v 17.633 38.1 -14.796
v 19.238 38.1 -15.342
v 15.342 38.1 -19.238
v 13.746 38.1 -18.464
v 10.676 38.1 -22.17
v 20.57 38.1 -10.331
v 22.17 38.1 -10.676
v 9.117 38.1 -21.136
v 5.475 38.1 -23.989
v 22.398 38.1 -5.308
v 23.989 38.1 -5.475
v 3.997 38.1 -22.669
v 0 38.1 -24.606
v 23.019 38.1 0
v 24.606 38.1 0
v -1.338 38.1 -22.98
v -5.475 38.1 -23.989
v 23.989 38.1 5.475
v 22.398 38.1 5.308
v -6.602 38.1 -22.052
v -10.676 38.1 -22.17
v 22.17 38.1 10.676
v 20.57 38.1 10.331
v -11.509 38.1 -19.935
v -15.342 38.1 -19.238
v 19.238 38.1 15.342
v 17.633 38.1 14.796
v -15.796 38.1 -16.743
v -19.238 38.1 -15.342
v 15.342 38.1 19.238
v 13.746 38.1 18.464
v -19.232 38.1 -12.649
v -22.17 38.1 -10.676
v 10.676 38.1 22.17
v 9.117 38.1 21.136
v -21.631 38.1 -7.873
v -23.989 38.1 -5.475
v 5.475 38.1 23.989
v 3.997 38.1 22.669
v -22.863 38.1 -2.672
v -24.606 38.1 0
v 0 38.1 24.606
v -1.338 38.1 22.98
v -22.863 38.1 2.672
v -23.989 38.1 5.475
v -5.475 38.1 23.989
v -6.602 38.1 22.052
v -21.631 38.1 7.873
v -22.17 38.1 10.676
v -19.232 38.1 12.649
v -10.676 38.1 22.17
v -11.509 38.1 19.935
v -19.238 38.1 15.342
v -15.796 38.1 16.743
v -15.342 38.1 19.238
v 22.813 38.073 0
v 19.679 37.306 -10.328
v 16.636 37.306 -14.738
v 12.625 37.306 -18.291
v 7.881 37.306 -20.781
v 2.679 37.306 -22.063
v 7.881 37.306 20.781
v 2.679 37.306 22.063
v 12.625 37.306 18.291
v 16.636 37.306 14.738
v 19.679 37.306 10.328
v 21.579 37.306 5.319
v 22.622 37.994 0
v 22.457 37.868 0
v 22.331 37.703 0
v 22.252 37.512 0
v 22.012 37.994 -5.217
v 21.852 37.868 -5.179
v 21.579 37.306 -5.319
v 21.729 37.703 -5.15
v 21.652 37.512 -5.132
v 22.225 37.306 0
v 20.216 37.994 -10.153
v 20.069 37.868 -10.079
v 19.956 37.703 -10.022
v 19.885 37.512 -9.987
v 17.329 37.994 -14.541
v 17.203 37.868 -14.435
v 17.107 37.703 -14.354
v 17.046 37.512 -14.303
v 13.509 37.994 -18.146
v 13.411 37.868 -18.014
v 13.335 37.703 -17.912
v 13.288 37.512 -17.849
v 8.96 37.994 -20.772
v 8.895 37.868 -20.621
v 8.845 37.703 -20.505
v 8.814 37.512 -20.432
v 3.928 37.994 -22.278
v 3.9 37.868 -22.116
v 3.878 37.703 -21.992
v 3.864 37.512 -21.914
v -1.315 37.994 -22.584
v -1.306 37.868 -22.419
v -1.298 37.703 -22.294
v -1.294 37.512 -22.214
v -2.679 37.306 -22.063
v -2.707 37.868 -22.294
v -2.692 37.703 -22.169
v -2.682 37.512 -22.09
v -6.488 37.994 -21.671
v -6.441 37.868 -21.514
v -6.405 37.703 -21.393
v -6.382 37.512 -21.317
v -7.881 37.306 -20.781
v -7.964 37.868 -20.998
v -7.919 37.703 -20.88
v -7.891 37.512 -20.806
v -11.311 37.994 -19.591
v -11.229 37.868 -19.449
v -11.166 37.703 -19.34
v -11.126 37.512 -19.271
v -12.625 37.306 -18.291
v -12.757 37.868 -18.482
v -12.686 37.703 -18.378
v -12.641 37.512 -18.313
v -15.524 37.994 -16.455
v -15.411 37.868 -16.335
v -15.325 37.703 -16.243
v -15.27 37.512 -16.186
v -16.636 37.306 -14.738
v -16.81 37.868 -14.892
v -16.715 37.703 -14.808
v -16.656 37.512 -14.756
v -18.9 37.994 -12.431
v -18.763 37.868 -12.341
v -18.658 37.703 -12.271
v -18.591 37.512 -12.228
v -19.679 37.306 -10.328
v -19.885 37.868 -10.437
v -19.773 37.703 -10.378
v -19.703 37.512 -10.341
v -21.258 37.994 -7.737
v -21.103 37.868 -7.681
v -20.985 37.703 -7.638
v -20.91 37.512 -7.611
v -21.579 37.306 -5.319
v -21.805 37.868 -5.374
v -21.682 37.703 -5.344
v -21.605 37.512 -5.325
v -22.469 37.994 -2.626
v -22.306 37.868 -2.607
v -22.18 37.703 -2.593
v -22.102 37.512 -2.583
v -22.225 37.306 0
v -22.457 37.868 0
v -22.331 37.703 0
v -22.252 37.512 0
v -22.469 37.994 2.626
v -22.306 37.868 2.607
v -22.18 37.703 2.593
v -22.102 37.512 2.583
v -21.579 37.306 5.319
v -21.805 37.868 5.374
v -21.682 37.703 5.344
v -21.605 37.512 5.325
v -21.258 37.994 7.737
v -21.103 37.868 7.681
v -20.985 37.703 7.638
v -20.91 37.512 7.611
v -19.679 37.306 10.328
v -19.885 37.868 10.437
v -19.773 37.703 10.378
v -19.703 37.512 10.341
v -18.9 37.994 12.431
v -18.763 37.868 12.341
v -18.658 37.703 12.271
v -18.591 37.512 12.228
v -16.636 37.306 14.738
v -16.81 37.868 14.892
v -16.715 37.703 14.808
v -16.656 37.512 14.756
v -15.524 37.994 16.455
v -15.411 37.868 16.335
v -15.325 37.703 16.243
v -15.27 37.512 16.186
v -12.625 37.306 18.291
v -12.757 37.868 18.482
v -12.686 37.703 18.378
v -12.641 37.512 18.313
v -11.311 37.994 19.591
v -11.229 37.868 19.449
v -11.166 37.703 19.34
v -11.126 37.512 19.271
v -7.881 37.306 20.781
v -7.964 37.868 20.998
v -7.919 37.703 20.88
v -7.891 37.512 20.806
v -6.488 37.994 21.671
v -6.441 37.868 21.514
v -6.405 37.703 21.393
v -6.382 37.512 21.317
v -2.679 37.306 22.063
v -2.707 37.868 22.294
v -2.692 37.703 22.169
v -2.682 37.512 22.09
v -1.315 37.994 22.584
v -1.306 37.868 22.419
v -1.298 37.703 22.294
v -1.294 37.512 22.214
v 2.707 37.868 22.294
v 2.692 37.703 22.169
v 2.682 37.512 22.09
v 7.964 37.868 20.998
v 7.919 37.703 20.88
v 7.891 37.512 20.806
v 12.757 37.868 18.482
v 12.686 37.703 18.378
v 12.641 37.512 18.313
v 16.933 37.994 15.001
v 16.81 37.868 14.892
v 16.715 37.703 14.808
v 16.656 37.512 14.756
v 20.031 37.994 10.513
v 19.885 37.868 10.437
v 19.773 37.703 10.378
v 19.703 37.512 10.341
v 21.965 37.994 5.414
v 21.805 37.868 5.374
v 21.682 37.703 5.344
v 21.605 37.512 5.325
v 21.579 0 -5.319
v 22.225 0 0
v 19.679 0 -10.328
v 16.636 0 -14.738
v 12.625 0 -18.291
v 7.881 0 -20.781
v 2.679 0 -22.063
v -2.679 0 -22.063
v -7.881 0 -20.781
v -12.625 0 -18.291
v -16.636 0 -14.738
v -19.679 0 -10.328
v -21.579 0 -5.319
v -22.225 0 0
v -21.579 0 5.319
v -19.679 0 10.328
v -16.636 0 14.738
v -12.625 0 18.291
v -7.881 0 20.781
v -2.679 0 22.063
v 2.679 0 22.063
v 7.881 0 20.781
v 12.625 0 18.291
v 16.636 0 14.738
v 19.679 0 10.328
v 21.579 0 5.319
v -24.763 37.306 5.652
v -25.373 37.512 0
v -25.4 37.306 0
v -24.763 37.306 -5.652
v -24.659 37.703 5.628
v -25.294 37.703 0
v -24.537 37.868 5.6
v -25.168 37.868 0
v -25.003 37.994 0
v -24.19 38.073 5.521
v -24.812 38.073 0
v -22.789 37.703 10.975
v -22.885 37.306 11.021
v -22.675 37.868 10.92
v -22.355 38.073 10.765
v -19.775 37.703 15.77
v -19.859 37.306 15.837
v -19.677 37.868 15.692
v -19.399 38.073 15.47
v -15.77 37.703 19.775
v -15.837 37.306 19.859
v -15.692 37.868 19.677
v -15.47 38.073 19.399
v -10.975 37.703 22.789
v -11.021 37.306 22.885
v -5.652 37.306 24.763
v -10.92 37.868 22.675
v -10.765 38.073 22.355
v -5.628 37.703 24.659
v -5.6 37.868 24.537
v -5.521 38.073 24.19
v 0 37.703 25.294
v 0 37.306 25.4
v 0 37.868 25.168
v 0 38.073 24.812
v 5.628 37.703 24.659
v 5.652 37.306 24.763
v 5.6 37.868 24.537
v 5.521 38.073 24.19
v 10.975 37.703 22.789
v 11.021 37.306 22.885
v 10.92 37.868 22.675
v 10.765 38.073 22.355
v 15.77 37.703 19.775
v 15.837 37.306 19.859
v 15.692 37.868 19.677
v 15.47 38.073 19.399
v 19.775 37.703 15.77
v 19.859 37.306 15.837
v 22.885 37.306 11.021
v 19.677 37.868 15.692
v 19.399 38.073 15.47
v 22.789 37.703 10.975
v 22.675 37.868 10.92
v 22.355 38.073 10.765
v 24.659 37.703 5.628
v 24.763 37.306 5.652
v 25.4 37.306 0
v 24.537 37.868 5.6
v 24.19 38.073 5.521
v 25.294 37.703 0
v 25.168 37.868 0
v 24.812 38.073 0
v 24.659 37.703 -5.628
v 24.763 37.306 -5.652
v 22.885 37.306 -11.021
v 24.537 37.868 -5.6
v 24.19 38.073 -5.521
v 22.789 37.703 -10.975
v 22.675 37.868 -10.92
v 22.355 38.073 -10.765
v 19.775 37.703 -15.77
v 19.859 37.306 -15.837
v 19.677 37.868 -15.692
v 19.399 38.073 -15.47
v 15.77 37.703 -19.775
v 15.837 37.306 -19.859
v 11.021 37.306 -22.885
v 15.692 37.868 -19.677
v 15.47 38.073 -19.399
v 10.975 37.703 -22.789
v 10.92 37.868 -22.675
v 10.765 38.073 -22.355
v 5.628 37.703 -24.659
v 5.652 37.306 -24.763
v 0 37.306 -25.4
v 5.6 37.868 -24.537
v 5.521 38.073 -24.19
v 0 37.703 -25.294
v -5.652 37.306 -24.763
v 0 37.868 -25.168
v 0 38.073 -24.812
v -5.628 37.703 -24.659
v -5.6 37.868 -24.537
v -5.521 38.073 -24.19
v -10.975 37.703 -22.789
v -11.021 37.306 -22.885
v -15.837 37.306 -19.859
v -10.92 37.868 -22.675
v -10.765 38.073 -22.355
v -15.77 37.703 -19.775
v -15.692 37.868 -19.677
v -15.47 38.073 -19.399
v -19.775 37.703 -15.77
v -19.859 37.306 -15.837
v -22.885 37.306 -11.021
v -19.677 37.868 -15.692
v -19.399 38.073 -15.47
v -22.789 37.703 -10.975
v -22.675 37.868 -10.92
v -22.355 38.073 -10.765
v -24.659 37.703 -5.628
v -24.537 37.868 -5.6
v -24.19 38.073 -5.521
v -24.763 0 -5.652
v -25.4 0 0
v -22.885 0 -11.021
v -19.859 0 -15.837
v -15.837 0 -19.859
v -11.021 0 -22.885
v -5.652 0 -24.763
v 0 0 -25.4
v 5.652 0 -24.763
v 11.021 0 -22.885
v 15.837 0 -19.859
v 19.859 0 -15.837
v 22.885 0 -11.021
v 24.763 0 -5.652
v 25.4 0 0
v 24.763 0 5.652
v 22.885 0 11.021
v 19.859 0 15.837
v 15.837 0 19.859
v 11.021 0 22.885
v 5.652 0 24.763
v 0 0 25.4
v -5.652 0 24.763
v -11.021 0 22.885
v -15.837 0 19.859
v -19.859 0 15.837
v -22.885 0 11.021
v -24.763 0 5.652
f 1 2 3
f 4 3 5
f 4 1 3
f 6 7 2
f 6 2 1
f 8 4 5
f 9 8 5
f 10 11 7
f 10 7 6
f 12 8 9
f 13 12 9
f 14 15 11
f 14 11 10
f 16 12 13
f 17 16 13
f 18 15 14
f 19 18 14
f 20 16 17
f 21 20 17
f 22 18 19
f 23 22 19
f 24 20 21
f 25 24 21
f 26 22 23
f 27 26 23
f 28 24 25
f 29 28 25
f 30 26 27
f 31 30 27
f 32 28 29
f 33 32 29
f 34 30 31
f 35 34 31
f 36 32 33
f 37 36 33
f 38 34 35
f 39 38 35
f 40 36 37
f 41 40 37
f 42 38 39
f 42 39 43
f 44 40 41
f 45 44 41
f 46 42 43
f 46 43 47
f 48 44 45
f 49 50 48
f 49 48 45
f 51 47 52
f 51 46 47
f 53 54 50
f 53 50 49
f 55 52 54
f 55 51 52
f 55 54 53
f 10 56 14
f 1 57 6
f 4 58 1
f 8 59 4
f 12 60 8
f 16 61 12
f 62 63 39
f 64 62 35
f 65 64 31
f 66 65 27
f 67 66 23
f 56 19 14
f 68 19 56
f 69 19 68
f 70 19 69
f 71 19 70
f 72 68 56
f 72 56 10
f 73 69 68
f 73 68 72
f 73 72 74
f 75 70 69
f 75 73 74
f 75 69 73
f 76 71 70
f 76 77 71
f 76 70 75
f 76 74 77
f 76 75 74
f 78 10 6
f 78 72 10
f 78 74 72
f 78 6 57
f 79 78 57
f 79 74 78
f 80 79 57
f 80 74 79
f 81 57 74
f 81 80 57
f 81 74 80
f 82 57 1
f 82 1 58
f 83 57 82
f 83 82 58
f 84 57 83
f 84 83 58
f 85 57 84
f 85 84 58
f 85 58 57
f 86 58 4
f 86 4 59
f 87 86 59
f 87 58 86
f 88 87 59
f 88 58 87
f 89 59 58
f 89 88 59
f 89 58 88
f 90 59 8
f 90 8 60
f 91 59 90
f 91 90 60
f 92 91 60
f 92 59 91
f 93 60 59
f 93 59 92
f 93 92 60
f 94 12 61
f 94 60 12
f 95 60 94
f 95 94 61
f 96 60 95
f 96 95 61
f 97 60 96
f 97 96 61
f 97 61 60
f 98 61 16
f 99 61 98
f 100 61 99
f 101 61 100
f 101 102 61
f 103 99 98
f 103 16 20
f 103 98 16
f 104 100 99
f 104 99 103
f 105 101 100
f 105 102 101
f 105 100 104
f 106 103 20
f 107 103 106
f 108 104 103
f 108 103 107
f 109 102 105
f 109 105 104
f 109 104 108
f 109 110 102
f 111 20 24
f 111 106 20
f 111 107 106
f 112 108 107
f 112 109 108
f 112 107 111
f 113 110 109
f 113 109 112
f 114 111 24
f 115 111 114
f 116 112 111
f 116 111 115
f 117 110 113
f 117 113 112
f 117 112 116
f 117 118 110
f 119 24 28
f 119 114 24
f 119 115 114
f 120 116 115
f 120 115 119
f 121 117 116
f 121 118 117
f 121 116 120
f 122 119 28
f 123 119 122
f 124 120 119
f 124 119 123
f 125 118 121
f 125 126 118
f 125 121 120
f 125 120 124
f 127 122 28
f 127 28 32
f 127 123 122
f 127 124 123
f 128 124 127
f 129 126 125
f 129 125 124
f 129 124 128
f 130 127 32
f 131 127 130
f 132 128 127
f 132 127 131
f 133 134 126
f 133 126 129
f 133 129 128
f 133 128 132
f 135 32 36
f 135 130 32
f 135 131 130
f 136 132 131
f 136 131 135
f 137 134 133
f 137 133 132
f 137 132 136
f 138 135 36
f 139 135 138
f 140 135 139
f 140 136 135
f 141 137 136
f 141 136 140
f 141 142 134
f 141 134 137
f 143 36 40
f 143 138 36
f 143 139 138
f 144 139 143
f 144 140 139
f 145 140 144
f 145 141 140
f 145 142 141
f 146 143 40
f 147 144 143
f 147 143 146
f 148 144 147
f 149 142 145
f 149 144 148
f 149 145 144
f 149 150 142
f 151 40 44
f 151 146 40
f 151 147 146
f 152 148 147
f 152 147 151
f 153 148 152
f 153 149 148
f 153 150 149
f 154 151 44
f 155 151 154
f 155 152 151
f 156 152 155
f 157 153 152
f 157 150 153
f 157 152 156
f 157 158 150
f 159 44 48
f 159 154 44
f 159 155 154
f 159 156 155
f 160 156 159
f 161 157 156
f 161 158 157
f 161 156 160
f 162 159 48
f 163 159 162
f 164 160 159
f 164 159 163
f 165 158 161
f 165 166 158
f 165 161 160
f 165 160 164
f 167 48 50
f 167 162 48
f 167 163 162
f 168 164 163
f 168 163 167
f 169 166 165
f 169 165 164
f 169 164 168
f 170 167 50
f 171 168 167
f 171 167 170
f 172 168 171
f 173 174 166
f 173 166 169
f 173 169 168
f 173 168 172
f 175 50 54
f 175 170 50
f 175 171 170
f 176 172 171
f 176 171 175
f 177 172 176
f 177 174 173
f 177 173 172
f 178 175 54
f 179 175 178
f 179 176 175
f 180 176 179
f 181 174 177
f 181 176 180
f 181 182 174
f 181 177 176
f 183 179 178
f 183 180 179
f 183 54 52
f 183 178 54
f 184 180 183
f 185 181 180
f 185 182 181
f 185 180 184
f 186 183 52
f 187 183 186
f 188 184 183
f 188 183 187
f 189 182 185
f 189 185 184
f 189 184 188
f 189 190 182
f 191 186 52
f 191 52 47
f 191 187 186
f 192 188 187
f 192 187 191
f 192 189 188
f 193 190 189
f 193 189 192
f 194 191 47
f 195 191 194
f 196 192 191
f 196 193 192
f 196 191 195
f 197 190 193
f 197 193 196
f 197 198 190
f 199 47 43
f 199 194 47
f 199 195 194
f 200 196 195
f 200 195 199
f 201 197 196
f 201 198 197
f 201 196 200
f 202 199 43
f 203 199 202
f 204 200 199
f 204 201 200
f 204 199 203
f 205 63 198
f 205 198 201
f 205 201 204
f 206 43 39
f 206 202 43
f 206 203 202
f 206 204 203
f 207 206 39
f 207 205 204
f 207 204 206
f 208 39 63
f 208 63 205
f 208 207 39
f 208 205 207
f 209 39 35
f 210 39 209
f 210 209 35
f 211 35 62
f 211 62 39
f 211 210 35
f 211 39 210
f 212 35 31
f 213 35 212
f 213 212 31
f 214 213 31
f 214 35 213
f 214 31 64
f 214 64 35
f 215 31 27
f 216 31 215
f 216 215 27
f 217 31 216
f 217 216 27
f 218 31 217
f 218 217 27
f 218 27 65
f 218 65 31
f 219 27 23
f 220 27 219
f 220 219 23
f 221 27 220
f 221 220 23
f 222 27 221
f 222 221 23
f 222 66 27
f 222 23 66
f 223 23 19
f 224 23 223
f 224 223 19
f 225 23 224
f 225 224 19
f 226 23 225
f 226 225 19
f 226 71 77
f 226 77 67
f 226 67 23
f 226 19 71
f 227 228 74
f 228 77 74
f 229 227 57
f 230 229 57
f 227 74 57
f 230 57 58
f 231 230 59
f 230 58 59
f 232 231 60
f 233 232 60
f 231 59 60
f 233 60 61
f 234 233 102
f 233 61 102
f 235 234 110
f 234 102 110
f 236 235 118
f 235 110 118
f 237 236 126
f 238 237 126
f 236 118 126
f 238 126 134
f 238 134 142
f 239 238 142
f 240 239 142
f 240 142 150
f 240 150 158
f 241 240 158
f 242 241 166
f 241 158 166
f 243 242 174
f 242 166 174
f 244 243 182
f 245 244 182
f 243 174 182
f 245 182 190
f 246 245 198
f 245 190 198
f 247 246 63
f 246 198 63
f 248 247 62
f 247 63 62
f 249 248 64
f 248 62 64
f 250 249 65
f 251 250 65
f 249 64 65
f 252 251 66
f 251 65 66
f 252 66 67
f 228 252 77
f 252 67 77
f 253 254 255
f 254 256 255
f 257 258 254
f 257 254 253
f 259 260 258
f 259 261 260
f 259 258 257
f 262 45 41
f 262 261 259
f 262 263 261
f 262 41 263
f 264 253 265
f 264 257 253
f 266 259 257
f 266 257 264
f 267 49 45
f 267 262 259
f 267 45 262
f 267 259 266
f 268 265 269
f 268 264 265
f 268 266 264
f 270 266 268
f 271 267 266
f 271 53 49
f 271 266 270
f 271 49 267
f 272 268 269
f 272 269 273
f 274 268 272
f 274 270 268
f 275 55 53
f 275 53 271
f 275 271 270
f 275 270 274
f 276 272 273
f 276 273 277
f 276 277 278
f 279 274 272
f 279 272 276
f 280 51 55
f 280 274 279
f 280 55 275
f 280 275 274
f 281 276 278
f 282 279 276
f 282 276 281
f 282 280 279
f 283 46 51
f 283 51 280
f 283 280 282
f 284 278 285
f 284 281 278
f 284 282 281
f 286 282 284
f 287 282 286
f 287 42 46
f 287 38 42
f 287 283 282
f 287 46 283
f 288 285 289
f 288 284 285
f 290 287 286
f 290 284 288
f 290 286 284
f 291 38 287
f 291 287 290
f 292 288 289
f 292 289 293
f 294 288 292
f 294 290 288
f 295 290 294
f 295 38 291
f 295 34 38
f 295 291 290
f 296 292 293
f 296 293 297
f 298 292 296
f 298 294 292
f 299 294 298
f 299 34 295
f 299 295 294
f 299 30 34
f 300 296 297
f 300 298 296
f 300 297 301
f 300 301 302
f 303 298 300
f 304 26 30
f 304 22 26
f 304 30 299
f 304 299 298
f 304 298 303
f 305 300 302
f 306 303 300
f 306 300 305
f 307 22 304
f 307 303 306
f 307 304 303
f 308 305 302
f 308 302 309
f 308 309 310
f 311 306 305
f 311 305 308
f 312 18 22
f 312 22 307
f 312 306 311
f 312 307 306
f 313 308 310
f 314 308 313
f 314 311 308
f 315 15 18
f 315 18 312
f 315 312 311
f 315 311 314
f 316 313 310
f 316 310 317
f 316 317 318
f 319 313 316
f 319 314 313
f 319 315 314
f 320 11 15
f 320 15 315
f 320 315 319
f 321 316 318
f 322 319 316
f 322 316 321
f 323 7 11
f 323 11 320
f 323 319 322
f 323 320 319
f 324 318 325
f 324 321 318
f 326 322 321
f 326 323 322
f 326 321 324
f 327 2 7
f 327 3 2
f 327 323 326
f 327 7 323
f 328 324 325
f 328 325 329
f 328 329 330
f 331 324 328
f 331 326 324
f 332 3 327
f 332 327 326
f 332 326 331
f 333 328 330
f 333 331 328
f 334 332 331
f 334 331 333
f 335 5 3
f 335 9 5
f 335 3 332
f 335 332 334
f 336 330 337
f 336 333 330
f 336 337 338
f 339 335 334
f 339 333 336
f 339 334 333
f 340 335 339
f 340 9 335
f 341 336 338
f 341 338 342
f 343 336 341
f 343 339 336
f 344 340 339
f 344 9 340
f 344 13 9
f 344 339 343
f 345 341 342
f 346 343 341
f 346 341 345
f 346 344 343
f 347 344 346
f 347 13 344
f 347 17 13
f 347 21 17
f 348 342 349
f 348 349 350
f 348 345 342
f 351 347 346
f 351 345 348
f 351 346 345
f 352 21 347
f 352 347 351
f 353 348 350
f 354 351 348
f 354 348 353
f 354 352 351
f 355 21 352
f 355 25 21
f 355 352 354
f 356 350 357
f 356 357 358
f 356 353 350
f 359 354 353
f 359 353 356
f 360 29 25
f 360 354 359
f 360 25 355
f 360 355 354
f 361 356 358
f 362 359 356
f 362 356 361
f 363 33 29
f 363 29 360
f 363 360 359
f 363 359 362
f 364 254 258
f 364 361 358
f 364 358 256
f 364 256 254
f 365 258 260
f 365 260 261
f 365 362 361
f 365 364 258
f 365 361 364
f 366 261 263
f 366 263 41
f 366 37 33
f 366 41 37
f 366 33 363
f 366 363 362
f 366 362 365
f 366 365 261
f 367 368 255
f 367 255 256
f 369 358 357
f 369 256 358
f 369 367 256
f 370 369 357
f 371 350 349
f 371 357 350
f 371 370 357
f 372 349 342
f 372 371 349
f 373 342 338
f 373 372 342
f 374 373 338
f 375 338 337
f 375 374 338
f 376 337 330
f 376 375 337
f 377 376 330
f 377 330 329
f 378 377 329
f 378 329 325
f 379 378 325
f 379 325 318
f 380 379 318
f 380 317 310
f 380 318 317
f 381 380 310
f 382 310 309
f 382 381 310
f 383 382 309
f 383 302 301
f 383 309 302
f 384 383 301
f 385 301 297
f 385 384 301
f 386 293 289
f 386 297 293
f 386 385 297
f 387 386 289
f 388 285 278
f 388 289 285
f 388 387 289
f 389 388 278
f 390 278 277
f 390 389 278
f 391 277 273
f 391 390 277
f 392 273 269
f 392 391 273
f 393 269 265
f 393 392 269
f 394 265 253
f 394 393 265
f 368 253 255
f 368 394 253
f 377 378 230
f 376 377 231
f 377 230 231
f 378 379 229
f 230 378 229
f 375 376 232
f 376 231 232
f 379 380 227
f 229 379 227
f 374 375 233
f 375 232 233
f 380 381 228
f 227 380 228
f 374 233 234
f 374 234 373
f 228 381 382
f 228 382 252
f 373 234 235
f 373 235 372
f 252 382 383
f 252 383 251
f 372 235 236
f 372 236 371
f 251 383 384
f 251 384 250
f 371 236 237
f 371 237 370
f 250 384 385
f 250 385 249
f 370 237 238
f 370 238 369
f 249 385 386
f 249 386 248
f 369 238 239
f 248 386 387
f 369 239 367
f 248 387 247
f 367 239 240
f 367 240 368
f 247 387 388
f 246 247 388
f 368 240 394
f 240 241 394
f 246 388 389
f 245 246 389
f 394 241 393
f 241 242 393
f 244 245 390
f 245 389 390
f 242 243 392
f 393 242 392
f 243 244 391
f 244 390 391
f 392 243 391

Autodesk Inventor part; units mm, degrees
ref_plane "YZ Plane" through (0, 0, 0) normal (1, 0, 0) x (0, 1, 0)
ref_plane "XZ Plane" through (0, 0, 0) normal (0, 1, 0) x (-1, 0, 0)
ref_plane "XY Plane" through (0, 0, 0) normal (0, 0, 1) x (1, 0, 0)
sketch "Sketch1" plane through (0, 0, 0) normal (0, 1, 0) x (-1, 0, 0)
  circle A0 centre (0, 0) radius 25.4
  dimension "d0" = 50.8
extrude "Extrusion1" add sketch "Sketch1" along normal blind 38.1
sketch "Sketch5" plane through (0, 38.1, 0) normal (0, 1, 0) x (1, 0, 0)
  circle A0 centre (0, 0) radius 22.225
  dimension "d32" = 44.45
extrude "Extrusion4" cut sketch "Sketch5" against normal through all
fillet "Fillet1" radius 0.7937 2 edges at (-22.225, 38.1, 0) (25.4, 38.1, 0)
properties part number "WL-0012" material "Aluminum 6061"
